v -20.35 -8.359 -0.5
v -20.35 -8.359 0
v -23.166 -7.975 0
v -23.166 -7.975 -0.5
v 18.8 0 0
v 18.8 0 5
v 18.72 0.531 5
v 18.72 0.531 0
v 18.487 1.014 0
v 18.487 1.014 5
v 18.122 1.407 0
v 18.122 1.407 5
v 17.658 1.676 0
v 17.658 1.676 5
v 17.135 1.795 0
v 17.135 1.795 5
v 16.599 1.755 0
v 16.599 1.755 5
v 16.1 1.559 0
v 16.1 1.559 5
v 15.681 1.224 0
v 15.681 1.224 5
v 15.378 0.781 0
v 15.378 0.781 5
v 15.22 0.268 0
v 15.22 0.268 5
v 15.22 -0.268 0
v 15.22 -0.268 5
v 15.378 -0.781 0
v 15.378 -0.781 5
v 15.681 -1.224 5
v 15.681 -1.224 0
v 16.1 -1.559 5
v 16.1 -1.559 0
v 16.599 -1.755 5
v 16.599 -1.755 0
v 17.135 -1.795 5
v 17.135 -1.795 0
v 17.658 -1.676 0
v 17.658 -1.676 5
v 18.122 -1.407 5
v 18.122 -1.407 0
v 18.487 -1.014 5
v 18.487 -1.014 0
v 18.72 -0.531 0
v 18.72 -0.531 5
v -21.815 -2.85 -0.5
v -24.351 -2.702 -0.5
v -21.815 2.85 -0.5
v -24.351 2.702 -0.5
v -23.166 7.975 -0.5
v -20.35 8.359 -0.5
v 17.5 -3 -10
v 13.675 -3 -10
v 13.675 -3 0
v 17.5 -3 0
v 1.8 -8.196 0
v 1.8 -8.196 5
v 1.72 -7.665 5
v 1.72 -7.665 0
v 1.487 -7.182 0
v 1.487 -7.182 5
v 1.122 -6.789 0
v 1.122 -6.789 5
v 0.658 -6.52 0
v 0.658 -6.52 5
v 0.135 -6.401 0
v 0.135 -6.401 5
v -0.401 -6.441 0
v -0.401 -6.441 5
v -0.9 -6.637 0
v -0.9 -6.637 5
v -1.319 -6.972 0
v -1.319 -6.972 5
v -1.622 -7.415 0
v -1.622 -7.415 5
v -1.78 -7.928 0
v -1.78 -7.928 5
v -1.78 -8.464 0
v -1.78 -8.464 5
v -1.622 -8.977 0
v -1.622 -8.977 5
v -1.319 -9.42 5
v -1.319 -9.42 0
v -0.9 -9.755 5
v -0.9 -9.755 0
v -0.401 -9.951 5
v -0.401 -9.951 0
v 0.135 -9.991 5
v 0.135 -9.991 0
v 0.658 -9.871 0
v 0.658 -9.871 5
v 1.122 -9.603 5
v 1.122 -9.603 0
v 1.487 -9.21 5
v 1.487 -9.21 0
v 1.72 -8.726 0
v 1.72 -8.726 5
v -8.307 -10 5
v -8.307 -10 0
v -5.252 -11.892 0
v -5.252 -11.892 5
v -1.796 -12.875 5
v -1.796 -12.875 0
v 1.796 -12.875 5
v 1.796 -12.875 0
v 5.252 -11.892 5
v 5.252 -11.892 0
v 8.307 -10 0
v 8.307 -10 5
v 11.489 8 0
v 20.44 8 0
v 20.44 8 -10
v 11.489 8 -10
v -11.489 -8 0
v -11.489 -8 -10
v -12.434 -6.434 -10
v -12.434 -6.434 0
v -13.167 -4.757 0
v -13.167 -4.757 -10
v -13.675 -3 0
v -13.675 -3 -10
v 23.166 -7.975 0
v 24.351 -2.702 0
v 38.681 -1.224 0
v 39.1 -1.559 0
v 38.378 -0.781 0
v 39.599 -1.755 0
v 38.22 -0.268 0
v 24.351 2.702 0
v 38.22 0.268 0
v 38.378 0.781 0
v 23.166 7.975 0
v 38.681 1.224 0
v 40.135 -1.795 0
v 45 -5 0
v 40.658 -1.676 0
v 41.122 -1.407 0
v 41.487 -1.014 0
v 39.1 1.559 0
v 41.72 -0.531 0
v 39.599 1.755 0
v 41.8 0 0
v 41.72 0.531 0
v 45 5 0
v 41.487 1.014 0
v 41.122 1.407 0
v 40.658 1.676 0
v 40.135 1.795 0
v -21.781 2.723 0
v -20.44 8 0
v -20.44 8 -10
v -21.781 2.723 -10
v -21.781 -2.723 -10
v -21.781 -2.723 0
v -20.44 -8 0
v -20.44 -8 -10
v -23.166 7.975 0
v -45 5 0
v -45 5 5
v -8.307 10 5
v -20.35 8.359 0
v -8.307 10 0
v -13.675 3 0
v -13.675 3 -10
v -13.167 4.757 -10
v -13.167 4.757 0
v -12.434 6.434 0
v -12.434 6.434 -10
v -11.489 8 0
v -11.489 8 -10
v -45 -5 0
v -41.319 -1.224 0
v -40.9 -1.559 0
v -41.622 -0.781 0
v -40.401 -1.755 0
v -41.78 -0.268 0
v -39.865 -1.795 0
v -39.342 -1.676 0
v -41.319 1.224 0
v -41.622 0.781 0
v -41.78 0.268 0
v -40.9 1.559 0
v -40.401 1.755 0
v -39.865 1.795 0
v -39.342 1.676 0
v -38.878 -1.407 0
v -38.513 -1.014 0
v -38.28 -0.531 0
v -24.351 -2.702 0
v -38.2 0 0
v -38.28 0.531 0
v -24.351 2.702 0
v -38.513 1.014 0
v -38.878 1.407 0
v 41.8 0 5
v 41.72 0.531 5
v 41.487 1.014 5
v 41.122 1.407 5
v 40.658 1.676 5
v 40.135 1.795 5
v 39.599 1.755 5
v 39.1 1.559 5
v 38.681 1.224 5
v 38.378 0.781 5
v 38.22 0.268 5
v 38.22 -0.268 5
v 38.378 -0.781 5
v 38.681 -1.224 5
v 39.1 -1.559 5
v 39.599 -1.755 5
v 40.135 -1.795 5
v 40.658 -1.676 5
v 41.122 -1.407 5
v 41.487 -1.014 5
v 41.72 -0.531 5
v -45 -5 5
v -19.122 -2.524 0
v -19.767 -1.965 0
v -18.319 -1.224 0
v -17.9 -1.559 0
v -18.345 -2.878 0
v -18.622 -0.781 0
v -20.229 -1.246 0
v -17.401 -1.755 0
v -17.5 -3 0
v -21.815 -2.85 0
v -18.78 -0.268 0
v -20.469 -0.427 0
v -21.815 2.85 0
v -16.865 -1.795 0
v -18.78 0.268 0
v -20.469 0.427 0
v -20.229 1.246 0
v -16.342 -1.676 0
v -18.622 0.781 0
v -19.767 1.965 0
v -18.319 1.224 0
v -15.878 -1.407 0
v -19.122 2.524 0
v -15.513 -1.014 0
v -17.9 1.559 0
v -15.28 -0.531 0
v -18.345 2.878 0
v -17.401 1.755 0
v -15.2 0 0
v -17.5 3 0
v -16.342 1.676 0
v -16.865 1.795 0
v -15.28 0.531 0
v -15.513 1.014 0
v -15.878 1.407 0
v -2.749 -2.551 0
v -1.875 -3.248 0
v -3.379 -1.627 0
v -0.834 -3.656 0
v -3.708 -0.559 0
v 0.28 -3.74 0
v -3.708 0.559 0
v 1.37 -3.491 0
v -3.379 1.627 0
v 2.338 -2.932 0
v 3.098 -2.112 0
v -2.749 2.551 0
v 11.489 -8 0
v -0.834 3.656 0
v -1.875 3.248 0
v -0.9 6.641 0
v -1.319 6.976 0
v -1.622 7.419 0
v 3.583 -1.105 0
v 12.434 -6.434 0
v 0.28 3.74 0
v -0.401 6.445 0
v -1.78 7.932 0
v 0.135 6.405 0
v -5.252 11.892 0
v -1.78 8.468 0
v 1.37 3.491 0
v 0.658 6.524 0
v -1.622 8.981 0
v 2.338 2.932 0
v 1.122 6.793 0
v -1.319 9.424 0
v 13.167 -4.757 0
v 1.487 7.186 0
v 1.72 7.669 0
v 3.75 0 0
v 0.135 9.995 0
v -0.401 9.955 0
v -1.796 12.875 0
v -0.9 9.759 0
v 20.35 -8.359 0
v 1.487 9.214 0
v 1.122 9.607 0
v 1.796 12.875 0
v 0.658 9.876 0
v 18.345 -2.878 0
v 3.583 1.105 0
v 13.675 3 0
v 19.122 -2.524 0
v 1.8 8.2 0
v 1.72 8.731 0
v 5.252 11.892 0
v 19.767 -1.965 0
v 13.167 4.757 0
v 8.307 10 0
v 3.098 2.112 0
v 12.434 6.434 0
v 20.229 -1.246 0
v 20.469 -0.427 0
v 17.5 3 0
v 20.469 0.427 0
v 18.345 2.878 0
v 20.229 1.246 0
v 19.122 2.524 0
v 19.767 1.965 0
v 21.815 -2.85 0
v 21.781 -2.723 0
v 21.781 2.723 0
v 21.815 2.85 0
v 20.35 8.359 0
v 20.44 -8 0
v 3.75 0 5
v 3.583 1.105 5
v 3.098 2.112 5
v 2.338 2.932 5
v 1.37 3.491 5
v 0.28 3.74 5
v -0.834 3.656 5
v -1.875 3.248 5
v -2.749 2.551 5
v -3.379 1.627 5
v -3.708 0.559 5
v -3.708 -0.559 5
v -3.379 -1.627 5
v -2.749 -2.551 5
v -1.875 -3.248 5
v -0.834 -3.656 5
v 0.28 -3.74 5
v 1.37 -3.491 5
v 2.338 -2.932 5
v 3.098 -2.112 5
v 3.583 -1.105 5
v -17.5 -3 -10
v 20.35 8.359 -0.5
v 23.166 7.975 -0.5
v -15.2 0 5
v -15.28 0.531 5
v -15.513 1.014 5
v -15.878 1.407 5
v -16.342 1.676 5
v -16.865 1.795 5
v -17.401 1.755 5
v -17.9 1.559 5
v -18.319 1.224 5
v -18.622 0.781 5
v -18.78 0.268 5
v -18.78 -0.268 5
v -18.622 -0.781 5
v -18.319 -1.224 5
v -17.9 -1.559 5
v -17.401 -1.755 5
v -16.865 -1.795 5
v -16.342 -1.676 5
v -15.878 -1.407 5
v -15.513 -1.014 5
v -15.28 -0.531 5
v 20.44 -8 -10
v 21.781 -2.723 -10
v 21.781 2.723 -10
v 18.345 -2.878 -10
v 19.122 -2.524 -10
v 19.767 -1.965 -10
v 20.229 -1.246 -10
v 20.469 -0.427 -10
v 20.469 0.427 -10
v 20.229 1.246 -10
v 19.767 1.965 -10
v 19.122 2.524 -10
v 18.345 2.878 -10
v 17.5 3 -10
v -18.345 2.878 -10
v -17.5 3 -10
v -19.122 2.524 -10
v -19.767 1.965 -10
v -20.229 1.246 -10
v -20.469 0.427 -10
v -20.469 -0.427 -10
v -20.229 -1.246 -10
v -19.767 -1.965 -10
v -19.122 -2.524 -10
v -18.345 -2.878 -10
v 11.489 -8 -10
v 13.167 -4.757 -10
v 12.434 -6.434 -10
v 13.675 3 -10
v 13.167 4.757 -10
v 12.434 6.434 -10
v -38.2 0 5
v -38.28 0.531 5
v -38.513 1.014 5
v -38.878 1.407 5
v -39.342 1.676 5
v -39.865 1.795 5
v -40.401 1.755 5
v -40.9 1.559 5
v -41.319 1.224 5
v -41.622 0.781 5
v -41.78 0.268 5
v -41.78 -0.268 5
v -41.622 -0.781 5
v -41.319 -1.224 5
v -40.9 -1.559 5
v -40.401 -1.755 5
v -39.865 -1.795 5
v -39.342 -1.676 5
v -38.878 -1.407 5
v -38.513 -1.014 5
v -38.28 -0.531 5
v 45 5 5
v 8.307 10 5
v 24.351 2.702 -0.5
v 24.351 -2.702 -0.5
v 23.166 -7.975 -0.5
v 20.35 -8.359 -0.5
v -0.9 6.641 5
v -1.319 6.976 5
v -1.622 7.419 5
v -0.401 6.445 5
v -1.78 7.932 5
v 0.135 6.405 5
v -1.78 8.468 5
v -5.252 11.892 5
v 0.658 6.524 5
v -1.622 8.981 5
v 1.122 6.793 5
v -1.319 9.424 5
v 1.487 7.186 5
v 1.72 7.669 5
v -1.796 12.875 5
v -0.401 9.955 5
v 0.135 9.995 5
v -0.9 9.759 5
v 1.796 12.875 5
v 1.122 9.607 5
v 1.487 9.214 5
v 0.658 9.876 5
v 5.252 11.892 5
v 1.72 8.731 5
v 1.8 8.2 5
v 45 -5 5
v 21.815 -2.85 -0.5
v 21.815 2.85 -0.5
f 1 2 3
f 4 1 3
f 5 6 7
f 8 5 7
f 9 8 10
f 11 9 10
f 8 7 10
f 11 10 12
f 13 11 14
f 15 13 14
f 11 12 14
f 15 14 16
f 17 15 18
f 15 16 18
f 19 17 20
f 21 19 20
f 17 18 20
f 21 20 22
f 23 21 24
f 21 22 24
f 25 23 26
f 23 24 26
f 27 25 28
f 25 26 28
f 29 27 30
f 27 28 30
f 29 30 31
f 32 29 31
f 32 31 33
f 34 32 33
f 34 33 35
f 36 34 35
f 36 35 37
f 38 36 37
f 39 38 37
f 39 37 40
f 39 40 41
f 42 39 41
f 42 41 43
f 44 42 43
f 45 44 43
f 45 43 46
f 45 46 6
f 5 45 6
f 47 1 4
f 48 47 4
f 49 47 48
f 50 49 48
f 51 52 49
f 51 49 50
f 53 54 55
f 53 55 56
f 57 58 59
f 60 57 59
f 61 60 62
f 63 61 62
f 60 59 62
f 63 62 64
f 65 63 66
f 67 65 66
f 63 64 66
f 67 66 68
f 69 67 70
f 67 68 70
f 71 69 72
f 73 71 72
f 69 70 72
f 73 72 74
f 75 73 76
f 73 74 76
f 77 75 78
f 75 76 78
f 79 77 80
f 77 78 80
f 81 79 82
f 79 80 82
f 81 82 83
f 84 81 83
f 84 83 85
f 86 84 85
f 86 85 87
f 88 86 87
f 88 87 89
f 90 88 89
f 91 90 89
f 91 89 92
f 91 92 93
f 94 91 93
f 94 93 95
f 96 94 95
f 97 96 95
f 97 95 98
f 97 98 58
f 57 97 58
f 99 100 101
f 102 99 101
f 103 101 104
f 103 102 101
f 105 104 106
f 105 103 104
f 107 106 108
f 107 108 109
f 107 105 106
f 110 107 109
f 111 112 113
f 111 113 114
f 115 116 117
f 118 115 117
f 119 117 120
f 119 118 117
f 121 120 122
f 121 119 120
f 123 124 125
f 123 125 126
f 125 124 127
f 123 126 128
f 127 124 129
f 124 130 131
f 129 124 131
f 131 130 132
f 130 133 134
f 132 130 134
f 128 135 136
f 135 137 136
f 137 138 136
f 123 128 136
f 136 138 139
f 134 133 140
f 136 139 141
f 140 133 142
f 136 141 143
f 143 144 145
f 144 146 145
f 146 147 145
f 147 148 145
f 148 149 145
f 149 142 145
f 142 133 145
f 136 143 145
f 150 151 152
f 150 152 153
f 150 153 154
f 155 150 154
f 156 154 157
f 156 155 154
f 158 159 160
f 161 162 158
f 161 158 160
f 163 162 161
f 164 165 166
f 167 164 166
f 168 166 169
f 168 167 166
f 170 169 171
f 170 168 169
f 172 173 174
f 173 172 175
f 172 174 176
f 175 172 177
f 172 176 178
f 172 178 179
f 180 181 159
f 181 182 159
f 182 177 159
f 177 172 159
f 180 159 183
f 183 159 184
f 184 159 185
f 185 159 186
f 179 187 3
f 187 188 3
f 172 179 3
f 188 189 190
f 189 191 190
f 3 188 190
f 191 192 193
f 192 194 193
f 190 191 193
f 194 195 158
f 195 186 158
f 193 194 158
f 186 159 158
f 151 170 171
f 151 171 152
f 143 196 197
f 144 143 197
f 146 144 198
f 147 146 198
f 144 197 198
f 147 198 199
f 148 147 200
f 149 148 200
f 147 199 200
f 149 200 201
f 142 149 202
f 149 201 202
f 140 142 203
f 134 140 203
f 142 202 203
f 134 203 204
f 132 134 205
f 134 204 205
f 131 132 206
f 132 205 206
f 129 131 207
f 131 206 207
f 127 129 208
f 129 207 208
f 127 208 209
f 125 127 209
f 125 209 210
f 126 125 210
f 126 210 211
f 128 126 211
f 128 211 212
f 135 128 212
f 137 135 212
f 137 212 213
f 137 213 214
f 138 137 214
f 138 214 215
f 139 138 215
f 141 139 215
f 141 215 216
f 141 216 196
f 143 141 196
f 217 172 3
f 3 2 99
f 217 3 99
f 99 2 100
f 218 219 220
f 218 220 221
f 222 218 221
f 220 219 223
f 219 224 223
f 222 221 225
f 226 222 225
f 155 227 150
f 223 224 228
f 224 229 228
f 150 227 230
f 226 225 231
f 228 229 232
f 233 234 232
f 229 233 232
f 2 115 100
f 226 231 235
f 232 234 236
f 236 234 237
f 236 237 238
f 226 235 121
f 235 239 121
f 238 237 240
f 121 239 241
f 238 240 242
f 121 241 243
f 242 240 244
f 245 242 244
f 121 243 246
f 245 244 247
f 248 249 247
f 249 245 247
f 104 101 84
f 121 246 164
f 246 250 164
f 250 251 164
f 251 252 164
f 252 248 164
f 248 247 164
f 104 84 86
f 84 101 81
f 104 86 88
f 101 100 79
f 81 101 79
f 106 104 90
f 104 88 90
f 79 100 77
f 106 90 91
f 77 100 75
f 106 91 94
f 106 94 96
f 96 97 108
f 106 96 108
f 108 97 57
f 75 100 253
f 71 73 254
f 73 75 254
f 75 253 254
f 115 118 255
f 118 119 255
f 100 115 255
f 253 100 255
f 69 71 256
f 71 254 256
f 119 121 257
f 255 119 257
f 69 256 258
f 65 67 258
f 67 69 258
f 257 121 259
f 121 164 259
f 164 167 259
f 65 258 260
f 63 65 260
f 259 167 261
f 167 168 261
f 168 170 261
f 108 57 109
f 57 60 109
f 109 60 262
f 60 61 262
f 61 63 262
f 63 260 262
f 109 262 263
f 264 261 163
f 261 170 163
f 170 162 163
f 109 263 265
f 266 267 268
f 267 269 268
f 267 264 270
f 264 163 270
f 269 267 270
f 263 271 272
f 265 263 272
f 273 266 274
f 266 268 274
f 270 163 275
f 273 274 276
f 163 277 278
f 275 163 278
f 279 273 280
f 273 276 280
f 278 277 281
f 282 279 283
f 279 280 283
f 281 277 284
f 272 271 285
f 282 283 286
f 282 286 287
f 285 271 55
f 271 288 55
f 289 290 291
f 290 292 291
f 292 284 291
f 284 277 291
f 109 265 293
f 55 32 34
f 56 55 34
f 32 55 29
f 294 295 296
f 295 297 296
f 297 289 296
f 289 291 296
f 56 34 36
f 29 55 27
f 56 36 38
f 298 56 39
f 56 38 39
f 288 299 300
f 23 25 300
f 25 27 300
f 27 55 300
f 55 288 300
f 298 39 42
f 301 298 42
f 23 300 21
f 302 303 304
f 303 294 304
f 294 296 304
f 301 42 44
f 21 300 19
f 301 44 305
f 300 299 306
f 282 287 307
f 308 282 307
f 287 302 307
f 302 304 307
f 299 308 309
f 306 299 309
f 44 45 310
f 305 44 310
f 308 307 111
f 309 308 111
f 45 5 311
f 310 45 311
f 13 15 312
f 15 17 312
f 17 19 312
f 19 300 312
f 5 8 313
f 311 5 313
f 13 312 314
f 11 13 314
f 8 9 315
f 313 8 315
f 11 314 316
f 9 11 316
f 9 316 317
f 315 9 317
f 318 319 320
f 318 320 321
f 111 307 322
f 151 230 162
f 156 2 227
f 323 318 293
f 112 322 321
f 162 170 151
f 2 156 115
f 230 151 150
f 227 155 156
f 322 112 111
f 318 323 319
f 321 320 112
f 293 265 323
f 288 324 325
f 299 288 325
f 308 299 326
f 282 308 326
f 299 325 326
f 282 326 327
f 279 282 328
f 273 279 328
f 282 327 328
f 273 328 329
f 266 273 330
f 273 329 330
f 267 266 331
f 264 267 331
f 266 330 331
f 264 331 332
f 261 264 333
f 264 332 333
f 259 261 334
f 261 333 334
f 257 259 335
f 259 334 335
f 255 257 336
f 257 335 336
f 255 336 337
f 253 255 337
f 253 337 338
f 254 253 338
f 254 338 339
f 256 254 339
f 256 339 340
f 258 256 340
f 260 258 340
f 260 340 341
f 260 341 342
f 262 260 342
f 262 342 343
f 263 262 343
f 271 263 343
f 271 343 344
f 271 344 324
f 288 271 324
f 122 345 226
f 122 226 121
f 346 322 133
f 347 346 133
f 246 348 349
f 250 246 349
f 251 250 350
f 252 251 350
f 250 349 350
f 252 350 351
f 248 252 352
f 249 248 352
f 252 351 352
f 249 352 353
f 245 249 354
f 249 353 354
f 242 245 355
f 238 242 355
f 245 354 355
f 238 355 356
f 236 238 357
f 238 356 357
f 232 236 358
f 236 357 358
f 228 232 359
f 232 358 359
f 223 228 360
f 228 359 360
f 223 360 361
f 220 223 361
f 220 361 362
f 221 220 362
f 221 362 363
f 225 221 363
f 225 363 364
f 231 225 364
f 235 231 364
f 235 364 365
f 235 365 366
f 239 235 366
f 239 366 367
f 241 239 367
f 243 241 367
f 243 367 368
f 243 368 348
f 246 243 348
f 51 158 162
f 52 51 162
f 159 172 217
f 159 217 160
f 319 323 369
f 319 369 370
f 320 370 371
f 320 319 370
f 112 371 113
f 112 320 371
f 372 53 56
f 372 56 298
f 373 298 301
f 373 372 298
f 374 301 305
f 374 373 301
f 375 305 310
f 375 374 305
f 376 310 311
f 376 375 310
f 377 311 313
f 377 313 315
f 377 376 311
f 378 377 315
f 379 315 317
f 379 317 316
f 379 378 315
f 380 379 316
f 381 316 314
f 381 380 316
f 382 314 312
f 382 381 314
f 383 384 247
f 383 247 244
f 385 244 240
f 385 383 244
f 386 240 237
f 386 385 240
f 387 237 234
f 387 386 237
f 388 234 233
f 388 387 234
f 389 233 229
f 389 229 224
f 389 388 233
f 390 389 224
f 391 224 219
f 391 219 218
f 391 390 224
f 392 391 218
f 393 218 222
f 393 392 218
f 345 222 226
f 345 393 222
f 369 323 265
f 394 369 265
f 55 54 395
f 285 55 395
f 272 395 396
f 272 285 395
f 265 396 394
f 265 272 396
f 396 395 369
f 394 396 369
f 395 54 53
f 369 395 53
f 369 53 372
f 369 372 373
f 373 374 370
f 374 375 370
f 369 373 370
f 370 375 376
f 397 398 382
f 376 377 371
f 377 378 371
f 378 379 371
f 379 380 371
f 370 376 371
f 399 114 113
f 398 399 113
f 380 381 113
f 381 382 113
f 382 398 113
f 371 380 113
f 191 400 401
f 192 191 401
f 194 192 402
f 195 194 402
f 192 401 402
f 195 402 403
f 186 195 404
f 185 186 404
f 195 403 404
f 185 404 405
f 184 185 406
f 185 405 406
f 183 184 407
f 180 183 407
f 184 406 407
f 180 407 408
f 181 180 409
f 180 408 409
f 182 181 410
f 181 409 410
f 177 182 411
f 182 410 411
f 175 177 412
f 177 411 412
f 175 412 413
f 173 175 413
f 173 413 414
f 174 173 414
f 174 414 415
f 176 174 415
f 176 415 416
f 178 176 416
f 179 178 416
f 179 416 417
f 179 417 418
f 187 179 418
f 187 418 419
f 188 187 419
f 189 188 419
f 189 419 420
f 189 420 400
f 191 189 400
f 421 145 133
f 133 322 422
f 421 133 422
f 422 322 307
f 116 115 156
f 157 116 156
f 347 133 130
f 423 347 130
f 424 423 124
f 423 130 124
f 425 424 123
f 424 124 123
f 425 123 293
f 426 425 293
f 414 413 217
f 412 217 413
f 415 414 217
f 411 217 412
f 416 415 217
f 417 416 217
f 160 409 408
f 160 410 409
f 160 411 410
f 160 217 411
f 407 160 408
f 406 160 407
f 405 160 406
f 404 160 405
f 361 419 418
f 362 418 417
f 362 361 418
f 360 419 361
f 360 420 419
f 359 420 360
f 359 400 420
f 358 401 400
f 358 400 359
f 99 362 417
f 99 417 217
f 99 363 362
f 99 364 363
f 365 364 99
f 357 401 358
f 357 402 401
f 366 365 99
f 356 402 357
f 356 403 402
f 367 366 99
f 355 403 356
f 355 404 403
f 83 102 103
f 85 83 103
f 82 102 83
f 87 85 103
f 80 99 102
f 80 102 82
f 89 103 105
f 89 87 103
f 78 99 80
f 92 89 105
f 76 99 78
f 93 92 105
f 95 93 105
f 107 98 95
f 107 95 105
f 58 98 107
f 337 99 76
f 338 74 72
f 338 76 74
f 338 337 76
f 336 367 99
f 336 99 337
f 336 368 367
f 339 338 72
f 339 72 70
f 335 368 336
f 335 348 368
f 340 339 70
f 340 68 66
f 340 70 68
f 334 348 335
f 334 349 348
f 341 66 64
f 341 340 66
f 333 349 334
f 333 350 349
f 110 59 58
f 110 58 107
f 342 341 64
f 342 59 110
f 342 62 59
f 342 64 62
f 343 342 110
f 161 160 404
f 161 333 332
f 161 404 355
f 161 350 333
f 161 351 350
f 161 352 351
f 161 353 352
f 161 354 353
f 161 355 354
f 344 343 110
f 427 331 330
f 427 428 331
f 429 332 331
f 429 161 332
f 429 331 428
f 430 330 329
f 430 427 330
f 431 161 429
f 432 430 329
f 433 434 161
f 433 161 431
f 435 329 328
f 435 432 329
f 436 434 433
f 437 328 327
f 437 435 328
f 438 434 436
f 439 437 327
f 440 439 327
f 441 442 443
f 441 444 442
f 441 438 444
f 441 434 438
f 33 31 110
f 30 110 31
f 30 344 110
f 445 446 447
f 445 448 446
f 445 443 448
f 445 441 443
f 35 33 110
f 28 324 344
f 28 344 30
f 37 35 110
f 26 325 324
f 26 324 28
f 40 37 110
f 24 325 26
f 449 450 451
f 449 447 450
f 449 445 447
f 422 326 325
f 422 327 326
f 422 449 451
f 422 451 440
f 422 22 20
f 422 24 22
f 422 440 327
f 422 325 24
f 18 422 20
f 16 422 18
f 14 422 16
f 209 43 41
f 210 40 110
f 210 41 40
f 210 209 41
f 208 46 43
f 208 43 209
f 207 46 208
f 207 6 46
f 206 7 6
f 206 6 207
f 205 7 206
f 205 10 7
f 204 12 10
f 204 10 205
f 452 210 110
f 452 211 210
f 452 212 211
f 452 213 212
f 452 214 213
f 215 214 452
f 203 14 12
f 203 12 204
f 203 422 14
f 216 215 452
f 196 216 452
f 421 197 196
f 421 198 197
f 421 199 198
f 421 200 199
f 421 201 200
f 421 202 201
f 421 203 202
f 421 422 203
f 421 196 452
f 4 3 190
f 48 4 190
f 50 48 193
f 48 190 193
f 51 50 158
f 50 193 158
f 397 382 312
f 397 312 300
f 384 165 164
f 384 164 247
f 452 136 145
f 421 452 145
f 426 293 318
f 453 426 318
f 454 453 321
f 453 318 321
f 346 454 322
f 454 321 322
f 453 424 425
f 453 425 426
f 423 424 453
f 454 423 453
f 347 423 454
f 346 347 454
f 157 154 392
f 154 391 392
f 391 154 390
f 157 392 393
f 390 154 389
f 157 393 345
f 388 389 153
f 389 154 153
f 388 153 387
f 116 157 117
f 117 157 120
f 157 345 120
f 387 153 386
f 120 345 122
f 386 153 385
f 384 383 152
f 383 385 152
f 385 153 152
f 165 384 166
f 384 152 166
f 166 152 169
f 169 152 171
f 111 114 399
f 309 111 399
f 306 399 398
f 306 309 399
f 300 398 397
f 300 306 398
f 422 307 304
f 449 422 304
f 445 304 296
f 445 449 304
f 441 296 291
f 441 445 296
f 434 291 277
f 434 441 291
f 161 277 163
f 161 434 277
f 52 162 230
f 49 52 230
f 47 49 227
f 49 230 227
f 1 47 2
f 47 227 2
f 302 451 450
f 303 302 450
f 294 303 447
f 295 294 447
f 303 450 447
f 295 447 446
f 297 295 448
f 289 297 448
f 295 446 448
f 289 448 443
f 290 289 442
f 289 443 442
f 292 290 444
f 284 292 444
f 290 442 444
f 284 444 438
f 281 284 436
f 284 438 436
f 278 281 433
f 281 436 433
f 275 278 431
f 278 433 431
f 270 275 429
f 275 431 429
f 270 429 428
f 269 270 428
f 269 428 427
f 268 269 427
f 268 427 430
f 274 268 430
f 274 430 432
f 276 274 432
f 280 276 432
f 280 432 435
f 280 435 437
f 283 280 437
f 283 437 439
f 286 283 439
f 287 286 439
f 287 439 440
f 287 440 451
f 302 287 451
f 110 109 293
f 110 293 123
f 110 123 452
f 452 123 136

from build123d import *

# Parameters (mm, degrees)
SKETCH_1_W               = 90
SKETCH_1_H               = 20
EXTRUDE_1_DEPTH          = 5
SKETCH_4_R               = 13
SKETCH_4_R_2             = 3.75
SKETCH_4_R_3             = 1.8
EXTRUDE_3_DEPTH          = 5
SKETCH_3_R               = 1.8
CUT_EXTRUDE_1_DEPTH      = 48.106262853
SKETCH_4_3_R             = 3.75
SKETCH_4_3_R_2           = 1.8
CUT_EXTRUDE_3_DEPTH      = 48.106262853
EXTRUDE_4_DEPTH          = 10
SKETCH_8_W               = 46.403712297
SKETCH_8_H               = 9.925238464
SKETCH_8_H_2             = 7.991750451
CUT_EXTRUDE_4_DEPTH      = 10
CUT_EXTRUDE_5_DEPTH      = 10
CUT_EXTRUDE_5_DEPTH_BACK = 50.183330509
CUT_EXTRUDE_6_DEPTH      = 10
EXTRUDE_5_DEPTH          = 0.5


with BuildPart() as part:
    # ｽｹｯﾁ1 → ﾎﾞｽ - 押し出し1 (new body)
    with BuildSketch(Plane.XY):
        Rectangle(SKETCH_1_W, SKETCH_1_H)
    extrude(amount=EXTRUDE_1_DEPTH)

    # ｽｹｯﾁ4 → ﾎﾞｽ - 押し出し3 (add)
    with BuildSketch(Plane.XY.offset(5)):
        Circle(SKETCH_4_R)
        Circle(SKETCH_4_R_2, mode=Mode.SUBTRACT)
        with Locations((0, 8.2)):
            Circle(SKETCH_4_R_3, mode=Mode.SUBTRACT)
        with Locations((0, -8.195848947)):
            Circle(SKETCH_4_R_3, mode=Mode.SUBTRACT)
    extrude(amount=-EXTRUDE_3_DEPTH)

    # ｽｹｯﾁ3 → ｶｯﾄ - 押し出し1 (cut, through all)
    with BuildSketch(Plane.XY.offset(5)):
        with Locations((-40, 0)):
            Circle(SKETCH_3_R)
        with Locations((-17, 0)):
            Circle(SKETCH_3_R)
        with Locations((17, 0)):
            Circle(SKETCH_3_R)
        with Locations((40, 0)):
            Circle(SKETCH_3_R)
    extrude(amount=-CUT_EXTRUDE_1_DEPTH, mode=Mode.SUBTRACT)

    # ｽｹｯﾁ4<3> → ｶｯﾄ - 押し出し3 (cut, through all)
    with BuildSketch(Plane.XY.offset(5)):
        Circle(SKETCH_4_3_R)
        with Locations((0, 8.2)):
            Circle(SKETCH_4_3_R_2)
        with Locations((0, -8.195848947)):
            Circle(SKETCH_4_3_R_2)
    extrude(amount=-CUT_EXTRUDE_3_DEPTH, mode=Mode.SUBTRACT)

    # ｽｹｯﾁ6 → ﾎﾞｽ - 押し出し4 (add)
    with BuildSketch(Plane(origin=(0, 0, 0), x_dir=(-1, 0, 0), z_dir=(0, 0, -1))):
        with BuildLine():
            Line((-19.539767143, 10), (-9.797958971, 10))
            ThreePointArc((-9.797958971, 10), (-14, 0), (-9.797958971, -10))
            Line((-9.797958971, -10), (-19.539767143, -10))
            ThreePointArc((-19.539767143, -10), (-21.95, 0), (-19.539767143, 10))
        make_face()
        with BuildLine():
            Line((9.797958971, 10), (19.539767143, 10))
            ThreePointArc((19.539767143, 10), (21.95, 0), (19.539767143, -10))
            Line((19.539767143, -10), (9.797958971, -10))
            ThreePointArc((9.797958971, -10), (14, 0), (9.797958971, 10))
        make_face()
    extrude(amount=EXTRUDE_4_DEPTH)

    # ｽｹｯﾁ8 → ｶｯﾄ - 押し出し4 (cut)
    with BuildSketch(Plane(origin=(0, 0, -10), x_dir=(-1, 0, 0), z_dir=(0, 0, -1))):
        with Locations((0.837844805, 12.962619232)):
            Rectangle(SKETCH_8_W, SKETCH_8_H)
        with Locations((0.837844805, -11.995875226)):
            Rectangle(SKETCH_8_W, SKETCH_8_H_2)
    extrude(amount=-CUT_EXTRUDE_4_DEPTH, mode=Mode.SUBTRACT)

    # ｽｹｯﾁ9 → ｶｯﾄ - 押し出し5 (cut, two sides: drawn at the far end of the back side and taken through both)
    with BuildSketch(Plane.XY.offset(5).offset(-CUT_EXTRUDE_5_DEPTH_BACK)):
        Polygon((8.306623863, -10), (45, -5), (45, -10), align=None)
        Polygon((45, 5), (8.306623863, 10), (45, 10), align=None)
        Polygon((-8.306623863, 10), (-45, 10), (-45, 5), align=None)
        Polygon((-8.306623863, -10), (-45, -10), (-45, -5), align=None)
    extrude(amount=CUT_EXTRUDE_5_DEPTH + CUT_EXTRUDE_5_DEPTH_BACK, mode=Mode.SUBTRACT)

    # ｽｹｯﾁ12 → ｶｯﾄ - 押し出し6 (cut)
    with BuildSketch(Plane(origin=(0, 0, -10), x_dir=(-1, 0, 0), z_dir=(0, 0, -1))):
        with BuildLine():
            Line((-17.5, 3), (17.5, 3))
            ThreePointArc((17.5, 3), (20.5, 0), (17.5, -3))
            Line((17.5, -3), (-17.5, -3))
            ThreePointArc((-17.5, -3), (-20.5, 0), (-17.5, 3))
        make_face()
    extrude(amount=-CUT_EXTRUDE_6_DEPTH, mode=Mode.SUBTRACT)

    # ｽｹｯﾁ13 → ﾎﾞｽ - 押し出し5 (add)
    with BuildSketch(Plane(origin=(0, 0, 0), x_dir=(-1, 0, 0), z_dir=(0, 0, -1))):
        with BuildLine():
            Line((-20.35015639, 8.358895556), (-23.165607924, 7.97524981))
            ThreePointArc((-23.165607924, 7.97524981), (-24.5, 0), (-23.165607924, -7.97524981))
            Line((-23.165607924, -7.97524981), (-20.35015639, -8.358895556))
            ThreePointArc((-20.35015639, -8.358895556), (-22, 0), (-20.35015639, 8.358895556))
        make_face()
        with BuildLine():
            Line((23.165607924, 7.97524981), (20.35015639, 8.358895556))
            ThreePointArc((20.35015639, 8.358895556), (22, 0), (20.35015639, -8.358895556))
            Line((20.35015639, -8.358895556), (23.165607924, -7.97524981))
            ThreePointArc((23.165607924, -7.97524981), (24.5, 0), (23.165607924, 7.97524981))
        make_face()
    extrude(amount=EXTRUDE_5_DEPTH)


solid = part.part
